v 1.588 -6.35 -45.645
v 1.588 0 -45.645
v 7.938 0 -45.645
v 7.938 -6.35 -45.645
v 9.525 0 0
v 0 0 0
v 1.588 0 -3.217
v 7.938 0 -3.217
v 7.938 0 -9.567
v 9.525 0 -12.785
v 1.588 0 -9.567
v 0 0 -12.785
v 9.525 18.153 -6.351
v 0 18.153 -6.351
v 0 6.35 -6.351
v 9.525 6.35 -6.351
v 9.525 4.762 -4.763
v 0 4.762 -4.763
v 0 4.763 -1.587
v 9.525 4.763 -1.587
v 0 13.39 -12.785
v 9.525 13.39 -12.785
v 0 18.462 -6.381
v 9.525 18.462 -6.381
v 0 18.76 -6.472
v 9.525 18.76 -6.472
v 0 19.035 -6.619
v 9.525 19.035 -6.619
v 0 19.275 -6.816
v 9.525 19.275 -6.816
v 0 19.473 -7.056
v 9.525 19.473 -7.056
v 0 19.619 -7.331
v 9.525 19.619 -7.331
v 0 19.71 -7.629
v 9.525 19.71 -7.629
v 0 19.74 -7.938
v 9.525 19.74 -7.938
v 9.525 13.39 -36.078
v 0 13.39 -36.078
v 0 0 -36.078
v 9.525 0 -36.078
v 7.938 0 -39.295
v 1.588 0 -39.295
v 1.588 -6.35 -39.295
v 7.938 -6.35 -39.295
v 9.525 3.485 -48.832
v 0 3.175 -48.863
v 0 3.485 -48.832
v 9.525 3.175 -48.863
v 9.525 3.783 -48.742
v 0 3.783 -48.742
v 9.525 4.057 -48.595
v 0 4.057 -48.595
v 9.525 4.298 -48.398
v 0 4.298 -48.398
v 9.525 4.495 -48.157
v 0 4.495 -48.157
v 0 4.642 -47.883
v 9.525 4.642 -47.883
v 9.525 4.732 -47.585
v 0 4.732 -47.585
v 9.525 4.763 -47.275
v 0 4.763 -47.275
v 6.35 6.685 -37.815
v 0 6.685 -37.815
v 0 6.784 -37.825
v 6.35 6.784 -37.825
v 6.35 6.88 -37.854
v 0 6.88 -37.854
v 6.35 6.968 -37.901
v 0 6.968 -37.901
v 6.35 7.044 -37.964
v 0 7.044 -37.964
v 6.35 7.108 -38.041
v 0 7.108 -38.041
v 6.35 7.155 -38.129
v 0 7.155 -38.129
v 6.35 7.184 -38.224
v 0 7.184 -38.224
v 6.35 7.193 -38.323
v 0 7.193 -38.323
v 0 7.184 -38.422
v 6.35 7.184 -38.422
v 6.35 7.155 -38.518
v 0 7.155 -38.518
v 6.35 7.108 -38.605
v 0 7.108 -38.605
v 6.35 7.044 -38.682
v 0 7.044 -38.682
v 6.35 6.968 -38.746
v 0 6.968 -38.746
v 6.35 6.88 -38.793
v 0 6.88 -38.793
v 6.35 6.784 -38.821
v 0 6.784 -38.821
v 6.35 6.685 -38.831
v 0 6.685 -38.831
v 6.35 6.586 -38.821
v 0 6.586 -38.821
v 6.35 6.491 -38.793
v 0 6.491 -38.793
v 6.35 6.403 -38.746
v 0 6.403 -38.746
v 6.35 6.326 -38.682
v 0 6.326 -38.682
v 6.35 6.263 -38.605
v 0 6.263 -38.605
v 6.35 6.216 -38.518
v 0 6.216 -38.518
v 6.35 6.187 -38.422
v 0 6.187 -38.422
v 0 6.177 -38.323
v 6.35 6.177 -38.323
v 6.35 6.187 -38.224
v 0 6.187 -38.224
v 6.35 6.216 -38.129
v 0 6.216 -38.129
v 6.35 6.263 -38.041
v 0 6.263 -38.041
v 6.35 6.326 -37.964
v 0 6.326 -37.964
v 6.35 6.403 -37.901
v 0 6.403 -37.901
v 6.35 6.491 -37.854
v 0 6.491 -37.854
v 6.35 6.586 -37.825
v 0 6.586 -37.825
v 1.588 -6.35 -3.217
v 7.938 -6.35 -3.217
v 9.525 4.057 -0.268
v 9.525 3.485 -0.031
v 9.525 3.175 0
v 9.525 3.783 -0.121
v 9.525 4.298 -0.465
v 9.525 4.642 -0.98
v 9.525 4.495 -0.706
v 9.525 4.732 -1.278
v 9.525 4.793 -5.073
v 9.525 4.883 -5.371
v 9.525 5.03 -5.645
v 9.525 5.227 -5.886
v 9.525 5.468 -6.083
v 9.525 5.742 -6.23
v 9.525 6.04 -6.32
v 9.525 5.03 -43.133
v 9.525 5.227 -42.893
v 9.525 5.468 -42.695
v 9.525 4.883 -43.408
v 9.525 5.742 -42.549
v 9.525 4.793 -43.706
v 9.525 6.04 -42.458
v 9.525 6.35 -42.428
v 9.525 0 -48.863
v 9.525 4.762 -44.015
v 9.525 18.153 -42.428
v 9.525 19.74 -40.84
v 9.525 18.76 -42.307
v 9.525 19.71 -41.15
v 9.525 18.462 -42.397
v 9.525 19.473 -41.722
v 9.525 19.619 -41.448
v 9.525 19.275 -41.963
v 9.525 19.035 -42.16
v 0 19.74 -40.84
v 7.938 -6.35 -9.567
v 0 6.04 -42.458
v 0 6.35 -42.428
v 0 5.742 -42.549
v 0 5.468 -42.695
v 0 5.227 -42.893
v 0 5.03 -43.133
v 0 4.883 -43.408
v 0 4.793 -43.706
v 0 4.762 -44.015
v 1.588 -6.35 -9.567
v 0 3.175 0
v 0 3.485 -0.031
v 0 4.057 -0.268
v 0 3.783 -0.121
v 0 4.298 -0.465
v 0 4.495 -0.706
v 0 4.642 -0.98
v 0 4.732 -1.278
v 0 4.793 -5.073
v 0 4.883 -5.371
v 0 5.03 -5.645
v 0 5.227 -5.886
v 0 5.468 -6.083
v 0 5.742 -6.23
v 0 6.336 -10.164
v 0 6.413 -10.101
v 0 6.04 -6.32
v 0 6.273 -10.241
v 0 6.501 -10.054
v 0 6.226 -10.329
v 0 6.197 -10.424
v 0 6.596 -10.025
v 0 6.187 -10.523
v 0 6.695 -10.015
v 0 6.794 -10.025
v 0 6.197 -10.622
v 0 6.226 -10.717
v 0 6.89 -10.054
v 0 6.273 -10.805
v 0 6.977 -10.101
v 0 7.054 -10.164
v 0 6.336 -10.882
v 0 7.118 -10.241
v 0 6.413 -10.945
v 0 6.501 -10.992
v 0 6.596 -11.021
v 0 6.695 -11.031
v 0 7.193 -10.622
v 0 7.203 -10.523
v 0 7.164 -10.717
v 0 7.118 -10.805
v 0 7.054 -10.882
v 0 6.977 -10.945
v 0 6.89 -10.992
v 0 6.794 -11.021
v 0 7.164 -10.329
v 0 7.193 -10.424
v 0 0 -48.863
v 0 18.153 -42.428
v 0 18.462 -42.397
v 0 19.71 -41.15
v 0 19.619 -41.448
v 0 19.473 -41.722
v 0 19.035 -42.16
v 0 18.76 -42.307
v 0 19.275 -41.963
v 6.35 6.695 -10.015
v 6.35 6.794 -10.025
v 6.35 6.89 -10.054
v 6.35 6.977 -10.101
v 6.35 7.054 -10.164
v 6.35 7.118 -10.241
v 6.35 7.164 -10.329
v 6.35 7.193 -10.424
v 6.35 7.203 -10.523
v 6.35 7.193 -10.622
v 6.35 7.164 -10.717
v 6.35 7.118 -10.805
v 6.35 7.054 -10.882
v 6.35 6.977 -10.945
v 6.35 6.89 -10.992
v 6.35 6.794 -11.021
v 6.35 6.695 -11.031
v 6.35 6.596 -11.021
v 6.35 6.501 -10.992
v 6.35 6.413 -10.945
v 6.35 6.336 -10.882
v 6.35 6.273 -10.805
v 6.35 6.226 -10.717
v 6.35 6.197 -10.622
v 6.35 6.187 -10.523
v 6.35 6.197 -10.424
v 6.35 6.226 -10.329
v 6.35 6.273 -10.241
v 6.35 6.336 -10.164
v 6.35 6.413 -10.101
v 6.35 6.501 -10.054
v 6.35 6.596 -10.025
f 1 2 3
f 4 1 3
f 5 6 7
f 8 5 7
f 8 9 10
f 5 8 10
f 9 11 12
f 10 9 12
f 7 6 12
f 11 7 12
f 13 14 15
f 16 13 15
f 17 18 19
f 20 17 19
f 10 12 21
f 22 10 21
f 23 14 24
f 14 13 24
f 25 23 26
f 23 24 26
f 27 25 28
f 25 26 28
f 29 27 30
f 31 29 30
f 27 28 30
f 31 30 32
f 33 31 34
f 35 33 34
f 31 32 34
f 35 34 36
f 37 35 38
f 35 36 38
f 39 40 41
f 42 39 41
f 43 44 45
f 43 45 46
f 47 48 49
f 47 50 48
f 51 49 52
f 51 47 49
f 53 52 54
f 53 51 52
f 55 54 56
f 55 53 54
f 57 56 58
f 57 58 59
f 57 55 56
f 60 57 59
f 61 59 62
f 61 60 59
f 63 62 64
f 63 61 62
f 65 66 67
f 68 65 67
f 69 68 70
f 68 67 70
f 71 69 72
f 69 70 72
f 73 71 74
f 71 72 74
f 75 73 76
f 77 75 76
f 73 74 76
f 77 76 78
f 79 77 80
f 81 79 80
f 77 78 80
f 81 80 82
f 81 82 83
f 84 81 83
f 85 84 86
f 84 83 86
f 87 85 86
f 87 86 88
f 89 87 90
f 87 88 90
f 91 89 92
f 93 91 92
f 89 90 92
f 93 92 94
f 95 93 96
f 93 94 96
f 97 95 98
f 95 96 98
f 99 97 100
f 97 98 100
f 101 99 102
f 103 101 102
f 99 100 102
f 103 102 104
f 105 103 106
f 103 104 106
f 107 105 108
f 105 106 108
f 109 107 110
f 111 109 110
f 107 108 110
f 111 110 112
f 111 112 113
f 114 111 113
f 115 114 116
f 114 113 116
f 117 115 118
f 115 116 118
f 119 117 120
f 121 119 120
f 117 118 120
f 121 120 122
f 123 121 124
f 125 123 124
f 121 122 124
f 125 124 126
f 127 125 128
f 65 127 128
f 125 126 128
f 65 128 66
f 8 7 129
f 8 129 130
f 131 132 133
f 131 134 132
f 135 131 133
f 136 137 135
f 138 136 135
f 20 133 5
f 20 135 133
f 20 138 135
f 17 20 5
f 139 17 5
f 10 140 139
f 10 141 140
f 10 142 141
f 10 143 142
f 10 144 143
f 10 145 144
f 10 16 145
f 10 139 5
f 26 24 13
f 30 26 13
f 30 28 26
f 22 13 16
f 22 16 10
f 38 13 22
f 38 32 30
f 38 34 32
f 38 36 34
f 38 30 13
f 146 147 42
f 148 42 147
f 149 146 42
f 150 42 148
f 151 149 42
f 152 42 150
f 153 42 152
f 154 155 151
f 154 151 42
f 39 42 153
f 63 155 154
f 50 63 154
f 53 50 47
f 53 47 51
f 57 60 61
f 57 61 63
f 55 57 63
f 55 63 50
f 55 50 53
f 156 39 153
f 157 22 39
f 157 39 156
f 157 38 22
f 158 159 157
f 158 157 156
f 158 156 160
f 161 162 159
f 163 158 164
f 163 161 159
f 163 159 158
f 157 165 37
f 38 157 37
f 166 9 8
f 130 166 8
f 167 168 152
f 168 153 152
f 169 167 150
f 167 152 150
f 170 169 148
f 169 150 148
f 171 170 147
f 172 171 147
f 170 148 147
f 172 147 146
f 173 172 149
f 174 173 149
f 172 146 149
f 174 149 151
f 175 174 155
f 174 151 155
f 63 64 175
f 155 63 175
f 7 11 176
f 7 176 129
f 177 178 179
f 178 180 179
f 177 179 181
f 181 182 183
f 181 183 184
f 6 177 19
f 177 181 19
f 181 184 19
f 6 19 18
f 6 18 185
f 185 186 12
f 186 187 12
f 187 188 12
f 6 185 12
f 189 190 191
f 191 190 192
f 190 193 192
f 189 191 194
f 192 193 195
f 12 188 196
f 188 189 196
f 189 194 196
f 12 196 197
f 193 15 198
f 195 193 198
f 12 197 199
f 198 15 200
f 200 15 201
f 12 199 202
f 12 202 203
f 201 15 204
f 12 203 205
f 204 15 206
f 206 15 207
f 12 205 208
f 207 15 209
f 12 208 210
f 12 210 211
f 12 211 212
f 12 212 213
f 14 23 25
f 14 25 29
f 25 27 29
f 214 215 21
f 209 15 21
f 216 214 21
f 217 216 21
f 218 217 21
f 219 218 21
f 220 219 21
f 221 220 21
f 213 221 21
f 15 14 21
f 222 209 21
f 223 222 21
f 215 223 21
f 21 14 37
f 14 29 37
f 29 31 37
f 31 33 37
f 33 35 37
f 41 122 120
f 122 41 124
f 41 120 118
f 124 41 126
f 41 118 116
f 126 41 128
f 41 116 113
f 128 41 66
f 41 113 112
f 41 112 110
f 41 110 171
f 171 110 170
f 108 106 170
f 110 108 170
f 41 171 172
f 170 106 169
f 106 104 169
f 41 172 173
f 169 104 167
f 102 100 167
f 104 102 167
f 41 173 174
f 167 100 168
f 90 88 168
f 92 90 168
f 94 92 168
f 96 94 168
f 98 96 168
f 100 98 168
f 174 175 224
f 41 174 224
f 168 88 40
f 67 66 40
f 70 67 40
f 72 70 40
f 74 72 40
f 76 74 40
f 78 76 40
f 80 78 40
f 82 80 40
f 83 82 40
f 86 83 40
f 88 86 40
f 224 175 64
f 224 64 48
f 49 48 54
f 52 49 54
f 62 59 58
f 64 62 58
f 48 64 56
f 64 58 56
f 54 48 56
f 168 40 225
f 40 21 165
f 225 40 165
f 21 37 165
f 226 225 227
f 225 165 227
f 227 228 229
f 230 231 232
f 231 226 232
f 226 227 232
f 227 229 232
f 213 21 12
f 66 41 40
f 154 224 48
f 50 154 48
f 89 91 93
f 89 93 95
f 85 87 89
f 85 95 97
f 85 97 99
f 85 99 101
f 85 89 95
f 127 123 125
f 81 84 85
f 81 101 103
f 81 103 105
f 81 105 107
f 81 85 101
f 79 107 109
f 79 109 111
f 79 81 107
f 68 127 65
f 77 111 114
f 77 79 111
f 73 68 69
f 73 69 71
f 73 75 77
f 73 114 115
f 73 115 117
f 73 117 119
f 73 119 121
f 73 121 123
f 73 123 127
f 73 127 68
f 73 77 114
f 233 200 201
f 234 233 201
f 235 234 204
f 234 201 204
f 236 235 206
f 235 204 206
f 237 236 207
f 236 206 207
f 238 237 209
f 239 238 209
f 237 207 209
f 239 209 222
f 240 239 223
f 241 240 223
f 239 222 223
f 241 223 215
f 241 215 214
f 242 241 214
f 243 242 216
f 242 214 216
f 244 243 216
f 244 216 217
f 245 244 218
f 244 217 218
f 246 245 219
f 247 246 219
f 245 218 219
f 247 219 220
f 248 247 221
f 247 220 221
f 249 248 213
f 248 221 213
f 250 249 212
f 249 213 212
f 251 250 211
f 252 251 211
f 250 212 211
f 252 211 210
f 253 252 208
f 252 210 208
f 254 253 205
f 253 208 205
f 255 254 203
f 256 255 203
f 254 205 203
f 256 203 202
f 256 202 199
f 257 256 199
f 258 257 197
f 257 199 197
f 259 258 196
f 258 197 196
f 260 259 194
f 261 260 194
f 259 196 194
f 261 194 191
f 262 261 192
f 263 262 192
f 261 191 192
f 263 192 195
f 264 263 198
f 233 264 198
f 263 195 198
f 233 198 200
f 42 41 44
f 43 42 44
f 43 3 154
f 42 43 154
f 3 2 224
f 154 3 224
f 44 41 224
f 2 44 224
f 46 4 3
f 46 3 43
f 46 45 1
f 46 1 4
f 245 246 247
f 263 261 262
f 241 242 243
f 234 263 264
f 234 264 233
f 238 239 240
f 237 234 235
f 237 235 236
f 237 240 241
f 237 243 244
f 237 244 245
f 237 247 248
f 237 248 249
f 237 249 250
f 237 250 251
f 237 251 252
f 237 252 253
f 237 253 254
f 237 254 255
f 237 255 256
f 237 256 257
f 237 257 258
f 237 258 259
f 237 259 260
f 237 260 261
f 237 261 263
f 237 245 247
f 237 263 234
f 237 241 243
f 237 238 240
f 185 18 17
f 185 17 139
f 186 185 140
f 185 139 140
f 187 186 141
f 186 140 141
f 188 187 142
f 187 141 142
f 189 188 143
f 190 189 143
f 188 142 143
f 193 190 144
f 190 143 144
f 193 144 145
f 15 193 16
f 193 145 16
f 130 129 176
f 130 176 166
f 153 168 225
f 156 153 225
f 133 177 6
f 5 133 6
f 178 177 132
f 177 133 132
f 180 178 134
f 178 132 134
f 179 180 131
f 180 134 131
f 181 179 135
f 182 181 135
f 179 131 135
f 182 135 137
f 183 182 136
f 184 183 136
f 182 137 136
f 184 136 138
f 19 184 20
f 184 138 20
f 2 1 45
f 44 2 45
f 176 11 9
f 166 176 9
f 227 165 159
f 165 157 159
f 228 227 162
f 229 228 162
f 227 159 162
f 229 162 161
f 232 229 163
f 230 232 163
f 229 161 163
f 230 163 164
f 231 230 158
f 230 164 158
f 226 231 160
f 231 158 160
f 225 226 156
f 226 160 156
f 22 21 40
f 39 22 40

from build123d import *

# Parameters (mm, degrees)
BOSS_EXTRUDE1_DEPTH = 9.525
SKETCH3_R           = 0.508
CUT_EXTRUDE2_DEPTH  = 6.35
FILLET1_R           = 1.5875
ESQUISSE1_W         = 6.35
ESQUISSE1_H         = 6.35
BOSS_EXTRU_1_DEPTH  = 6.35


with BuildPart() as part:
    # Sketch1 → Boss-Extrude1 (new body)
    with BuildSketch(Plane(origin=(0, 0, 0), x_dir=(0, 0, -1), z_dir=(1, 0, 0))):
        Polygon((0, 0), (12.7847852, 0), (12.7847852, 13.390245), (36.0778552, 13.390245), (36.0778552, 0), (48.8626404, 0), (48.8626404, 4.7625), (42.4278552, 4.7625), (42.4278552, 19.740245), (41.4309052, 19.740245), (6.3509652, 19.740245), (6.3509652, 4.7625), (0, 4.7625), align=None)
    extrude(amount=BOSS_EXTRUDE1_DEPTH)

    # Sketch3 → Cut-Extrude2 (cut)
    with BuildSketch(Plane.ZY):
        with Locations((-38.3232152, 6.68528)):
            Circle(SKETCH3_R)
        with Locations((-10.5229152, 6.6951225)):
            Circle(SKETCH3_R)
    extrude(amount=-CUT_EXTRUDE2_DEPTH, mode=Mode.SUBTRACT)

    # Fillet1
    fillet1_edges = [part.edges().sort_by_distance(p)[0] for p in [
        (4.7625, 4.7625, 0),
        (4.7625, 4.7625, -6.3509652),
        (4.7625, 19.740245, -6.3509652),
        (4.7625, 19.740245, -42.4278552),
        (4.7625, 4.7625, -42.4278552),
        (4.7625, 4.7625, -48.8626404),
    ]]
    fillet(fillet1_edges, radius=FILLET1_R)

    # Esquisse1 → Boss.-Extru.1 (add)
    with BuildSketch(Plane.XZ):
        with Locations((4.7625, -42.4702478)):
            Rectangle(ESQUISSE1_W, ESQUISSE1_H)
        with Locations((4.7625, -6.3923926)):
            Rectangle(ESQUISSE1_W, ESQUISSE1_H)
    extrude(amount=BOSS_EXTRU_1_DEPTH)


solid = part.part
